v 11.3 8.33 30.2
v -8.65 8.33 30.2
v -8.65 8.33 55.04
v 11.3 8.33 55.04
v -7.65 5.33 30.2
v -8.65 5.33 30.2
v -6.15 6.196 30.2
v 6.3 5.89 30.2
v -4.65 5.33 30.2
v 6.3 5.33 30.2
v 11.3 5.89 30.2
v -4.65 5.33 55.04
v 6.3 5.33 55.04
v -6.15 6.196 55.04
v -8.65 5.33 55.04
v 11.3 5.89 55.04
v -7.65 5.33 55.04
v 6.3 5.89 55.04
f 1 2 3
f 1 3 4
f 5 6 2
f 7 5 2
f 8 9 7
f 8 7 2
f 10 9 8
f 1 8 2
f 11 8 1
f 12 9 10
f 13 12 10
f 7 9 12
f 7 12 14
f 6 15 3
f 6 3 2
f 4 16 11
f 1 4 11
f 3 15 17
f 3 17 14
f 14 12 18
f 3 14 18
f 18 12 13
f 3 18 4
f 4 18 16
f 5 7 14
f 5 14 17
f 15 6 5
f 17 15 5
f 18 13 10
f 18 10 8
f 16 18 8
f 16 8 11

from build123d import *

# Parameters (mm, degrees)
SKETCH011_W             = 19.95
SKETCH011_H             = 24.84
PAD002_DEPTH            = 3
POCKET008_DEPTH         = 12.421
POCKET008_DEPTH_BACK    = 12.421
SKETCH013_W             = 5
SKETCH013_H             = 0.56
POCKET009_DEPTH         = 12.421
POCKET009_DEPTH_BACK    = 12.421
BODY002_PLACEMENT_ANGLE = 270


with BuildPart() as part:
    # Sketch011 (on XY_Plane011 of Origin030) → Pad002 (new body)
    with BuildSketch(Plane.XY):
        with Locations((2.325, 0)):
            Rectangle(SKETCH011_W, SKETCH011_H)
    extrude(amount=PAD002_DEPTH)

    # Sketch012 (on XZ_Plane011 of Origin030) → Pocket008 (cut, two sides)
    with BuildSketch(Plane.XZ) as pocket008_sk:
        Polygon((-5.15, 0.866025), (-6.65, 0), (-3.65, 0), align=None)
    extrude(amount=-POCKET008_DEPTH, mode=Mode.SUBTRACT)
    extrude(pocket008_sk.sketch, amount=POCKET008_DEPTH_BACK, mode=Mode.SUBTRACT)

    # Sketch013 (on XZ_Plane011 of Origin030) → Pocket009 (cut, two sides)
    with BuildSketch(Plane.XZ) as pocket009_sk:
        with Locations((9.8, 0.28)):
            Rectangle(SKETCH013_W, SKETCH013_H)
    extrude(amount=-POCKET009_DEPTH, mode=Mode.SUBTRACT)
    extrude(pocket009_sk.sketch, amount=POCKET009_DEPTH_BACK, mode=Mode.SUBTRACT)


with BuildPart() as part_1:
    # Body002 placement: moved
    add(part.part.moved(Location((-1, 5.33, 42.62))).rotate(Axis((-1, 5.33, 42.62), (1, 0, 0)), BODY002_PLACEMENT_ANGLE))


solid = part_1.part
